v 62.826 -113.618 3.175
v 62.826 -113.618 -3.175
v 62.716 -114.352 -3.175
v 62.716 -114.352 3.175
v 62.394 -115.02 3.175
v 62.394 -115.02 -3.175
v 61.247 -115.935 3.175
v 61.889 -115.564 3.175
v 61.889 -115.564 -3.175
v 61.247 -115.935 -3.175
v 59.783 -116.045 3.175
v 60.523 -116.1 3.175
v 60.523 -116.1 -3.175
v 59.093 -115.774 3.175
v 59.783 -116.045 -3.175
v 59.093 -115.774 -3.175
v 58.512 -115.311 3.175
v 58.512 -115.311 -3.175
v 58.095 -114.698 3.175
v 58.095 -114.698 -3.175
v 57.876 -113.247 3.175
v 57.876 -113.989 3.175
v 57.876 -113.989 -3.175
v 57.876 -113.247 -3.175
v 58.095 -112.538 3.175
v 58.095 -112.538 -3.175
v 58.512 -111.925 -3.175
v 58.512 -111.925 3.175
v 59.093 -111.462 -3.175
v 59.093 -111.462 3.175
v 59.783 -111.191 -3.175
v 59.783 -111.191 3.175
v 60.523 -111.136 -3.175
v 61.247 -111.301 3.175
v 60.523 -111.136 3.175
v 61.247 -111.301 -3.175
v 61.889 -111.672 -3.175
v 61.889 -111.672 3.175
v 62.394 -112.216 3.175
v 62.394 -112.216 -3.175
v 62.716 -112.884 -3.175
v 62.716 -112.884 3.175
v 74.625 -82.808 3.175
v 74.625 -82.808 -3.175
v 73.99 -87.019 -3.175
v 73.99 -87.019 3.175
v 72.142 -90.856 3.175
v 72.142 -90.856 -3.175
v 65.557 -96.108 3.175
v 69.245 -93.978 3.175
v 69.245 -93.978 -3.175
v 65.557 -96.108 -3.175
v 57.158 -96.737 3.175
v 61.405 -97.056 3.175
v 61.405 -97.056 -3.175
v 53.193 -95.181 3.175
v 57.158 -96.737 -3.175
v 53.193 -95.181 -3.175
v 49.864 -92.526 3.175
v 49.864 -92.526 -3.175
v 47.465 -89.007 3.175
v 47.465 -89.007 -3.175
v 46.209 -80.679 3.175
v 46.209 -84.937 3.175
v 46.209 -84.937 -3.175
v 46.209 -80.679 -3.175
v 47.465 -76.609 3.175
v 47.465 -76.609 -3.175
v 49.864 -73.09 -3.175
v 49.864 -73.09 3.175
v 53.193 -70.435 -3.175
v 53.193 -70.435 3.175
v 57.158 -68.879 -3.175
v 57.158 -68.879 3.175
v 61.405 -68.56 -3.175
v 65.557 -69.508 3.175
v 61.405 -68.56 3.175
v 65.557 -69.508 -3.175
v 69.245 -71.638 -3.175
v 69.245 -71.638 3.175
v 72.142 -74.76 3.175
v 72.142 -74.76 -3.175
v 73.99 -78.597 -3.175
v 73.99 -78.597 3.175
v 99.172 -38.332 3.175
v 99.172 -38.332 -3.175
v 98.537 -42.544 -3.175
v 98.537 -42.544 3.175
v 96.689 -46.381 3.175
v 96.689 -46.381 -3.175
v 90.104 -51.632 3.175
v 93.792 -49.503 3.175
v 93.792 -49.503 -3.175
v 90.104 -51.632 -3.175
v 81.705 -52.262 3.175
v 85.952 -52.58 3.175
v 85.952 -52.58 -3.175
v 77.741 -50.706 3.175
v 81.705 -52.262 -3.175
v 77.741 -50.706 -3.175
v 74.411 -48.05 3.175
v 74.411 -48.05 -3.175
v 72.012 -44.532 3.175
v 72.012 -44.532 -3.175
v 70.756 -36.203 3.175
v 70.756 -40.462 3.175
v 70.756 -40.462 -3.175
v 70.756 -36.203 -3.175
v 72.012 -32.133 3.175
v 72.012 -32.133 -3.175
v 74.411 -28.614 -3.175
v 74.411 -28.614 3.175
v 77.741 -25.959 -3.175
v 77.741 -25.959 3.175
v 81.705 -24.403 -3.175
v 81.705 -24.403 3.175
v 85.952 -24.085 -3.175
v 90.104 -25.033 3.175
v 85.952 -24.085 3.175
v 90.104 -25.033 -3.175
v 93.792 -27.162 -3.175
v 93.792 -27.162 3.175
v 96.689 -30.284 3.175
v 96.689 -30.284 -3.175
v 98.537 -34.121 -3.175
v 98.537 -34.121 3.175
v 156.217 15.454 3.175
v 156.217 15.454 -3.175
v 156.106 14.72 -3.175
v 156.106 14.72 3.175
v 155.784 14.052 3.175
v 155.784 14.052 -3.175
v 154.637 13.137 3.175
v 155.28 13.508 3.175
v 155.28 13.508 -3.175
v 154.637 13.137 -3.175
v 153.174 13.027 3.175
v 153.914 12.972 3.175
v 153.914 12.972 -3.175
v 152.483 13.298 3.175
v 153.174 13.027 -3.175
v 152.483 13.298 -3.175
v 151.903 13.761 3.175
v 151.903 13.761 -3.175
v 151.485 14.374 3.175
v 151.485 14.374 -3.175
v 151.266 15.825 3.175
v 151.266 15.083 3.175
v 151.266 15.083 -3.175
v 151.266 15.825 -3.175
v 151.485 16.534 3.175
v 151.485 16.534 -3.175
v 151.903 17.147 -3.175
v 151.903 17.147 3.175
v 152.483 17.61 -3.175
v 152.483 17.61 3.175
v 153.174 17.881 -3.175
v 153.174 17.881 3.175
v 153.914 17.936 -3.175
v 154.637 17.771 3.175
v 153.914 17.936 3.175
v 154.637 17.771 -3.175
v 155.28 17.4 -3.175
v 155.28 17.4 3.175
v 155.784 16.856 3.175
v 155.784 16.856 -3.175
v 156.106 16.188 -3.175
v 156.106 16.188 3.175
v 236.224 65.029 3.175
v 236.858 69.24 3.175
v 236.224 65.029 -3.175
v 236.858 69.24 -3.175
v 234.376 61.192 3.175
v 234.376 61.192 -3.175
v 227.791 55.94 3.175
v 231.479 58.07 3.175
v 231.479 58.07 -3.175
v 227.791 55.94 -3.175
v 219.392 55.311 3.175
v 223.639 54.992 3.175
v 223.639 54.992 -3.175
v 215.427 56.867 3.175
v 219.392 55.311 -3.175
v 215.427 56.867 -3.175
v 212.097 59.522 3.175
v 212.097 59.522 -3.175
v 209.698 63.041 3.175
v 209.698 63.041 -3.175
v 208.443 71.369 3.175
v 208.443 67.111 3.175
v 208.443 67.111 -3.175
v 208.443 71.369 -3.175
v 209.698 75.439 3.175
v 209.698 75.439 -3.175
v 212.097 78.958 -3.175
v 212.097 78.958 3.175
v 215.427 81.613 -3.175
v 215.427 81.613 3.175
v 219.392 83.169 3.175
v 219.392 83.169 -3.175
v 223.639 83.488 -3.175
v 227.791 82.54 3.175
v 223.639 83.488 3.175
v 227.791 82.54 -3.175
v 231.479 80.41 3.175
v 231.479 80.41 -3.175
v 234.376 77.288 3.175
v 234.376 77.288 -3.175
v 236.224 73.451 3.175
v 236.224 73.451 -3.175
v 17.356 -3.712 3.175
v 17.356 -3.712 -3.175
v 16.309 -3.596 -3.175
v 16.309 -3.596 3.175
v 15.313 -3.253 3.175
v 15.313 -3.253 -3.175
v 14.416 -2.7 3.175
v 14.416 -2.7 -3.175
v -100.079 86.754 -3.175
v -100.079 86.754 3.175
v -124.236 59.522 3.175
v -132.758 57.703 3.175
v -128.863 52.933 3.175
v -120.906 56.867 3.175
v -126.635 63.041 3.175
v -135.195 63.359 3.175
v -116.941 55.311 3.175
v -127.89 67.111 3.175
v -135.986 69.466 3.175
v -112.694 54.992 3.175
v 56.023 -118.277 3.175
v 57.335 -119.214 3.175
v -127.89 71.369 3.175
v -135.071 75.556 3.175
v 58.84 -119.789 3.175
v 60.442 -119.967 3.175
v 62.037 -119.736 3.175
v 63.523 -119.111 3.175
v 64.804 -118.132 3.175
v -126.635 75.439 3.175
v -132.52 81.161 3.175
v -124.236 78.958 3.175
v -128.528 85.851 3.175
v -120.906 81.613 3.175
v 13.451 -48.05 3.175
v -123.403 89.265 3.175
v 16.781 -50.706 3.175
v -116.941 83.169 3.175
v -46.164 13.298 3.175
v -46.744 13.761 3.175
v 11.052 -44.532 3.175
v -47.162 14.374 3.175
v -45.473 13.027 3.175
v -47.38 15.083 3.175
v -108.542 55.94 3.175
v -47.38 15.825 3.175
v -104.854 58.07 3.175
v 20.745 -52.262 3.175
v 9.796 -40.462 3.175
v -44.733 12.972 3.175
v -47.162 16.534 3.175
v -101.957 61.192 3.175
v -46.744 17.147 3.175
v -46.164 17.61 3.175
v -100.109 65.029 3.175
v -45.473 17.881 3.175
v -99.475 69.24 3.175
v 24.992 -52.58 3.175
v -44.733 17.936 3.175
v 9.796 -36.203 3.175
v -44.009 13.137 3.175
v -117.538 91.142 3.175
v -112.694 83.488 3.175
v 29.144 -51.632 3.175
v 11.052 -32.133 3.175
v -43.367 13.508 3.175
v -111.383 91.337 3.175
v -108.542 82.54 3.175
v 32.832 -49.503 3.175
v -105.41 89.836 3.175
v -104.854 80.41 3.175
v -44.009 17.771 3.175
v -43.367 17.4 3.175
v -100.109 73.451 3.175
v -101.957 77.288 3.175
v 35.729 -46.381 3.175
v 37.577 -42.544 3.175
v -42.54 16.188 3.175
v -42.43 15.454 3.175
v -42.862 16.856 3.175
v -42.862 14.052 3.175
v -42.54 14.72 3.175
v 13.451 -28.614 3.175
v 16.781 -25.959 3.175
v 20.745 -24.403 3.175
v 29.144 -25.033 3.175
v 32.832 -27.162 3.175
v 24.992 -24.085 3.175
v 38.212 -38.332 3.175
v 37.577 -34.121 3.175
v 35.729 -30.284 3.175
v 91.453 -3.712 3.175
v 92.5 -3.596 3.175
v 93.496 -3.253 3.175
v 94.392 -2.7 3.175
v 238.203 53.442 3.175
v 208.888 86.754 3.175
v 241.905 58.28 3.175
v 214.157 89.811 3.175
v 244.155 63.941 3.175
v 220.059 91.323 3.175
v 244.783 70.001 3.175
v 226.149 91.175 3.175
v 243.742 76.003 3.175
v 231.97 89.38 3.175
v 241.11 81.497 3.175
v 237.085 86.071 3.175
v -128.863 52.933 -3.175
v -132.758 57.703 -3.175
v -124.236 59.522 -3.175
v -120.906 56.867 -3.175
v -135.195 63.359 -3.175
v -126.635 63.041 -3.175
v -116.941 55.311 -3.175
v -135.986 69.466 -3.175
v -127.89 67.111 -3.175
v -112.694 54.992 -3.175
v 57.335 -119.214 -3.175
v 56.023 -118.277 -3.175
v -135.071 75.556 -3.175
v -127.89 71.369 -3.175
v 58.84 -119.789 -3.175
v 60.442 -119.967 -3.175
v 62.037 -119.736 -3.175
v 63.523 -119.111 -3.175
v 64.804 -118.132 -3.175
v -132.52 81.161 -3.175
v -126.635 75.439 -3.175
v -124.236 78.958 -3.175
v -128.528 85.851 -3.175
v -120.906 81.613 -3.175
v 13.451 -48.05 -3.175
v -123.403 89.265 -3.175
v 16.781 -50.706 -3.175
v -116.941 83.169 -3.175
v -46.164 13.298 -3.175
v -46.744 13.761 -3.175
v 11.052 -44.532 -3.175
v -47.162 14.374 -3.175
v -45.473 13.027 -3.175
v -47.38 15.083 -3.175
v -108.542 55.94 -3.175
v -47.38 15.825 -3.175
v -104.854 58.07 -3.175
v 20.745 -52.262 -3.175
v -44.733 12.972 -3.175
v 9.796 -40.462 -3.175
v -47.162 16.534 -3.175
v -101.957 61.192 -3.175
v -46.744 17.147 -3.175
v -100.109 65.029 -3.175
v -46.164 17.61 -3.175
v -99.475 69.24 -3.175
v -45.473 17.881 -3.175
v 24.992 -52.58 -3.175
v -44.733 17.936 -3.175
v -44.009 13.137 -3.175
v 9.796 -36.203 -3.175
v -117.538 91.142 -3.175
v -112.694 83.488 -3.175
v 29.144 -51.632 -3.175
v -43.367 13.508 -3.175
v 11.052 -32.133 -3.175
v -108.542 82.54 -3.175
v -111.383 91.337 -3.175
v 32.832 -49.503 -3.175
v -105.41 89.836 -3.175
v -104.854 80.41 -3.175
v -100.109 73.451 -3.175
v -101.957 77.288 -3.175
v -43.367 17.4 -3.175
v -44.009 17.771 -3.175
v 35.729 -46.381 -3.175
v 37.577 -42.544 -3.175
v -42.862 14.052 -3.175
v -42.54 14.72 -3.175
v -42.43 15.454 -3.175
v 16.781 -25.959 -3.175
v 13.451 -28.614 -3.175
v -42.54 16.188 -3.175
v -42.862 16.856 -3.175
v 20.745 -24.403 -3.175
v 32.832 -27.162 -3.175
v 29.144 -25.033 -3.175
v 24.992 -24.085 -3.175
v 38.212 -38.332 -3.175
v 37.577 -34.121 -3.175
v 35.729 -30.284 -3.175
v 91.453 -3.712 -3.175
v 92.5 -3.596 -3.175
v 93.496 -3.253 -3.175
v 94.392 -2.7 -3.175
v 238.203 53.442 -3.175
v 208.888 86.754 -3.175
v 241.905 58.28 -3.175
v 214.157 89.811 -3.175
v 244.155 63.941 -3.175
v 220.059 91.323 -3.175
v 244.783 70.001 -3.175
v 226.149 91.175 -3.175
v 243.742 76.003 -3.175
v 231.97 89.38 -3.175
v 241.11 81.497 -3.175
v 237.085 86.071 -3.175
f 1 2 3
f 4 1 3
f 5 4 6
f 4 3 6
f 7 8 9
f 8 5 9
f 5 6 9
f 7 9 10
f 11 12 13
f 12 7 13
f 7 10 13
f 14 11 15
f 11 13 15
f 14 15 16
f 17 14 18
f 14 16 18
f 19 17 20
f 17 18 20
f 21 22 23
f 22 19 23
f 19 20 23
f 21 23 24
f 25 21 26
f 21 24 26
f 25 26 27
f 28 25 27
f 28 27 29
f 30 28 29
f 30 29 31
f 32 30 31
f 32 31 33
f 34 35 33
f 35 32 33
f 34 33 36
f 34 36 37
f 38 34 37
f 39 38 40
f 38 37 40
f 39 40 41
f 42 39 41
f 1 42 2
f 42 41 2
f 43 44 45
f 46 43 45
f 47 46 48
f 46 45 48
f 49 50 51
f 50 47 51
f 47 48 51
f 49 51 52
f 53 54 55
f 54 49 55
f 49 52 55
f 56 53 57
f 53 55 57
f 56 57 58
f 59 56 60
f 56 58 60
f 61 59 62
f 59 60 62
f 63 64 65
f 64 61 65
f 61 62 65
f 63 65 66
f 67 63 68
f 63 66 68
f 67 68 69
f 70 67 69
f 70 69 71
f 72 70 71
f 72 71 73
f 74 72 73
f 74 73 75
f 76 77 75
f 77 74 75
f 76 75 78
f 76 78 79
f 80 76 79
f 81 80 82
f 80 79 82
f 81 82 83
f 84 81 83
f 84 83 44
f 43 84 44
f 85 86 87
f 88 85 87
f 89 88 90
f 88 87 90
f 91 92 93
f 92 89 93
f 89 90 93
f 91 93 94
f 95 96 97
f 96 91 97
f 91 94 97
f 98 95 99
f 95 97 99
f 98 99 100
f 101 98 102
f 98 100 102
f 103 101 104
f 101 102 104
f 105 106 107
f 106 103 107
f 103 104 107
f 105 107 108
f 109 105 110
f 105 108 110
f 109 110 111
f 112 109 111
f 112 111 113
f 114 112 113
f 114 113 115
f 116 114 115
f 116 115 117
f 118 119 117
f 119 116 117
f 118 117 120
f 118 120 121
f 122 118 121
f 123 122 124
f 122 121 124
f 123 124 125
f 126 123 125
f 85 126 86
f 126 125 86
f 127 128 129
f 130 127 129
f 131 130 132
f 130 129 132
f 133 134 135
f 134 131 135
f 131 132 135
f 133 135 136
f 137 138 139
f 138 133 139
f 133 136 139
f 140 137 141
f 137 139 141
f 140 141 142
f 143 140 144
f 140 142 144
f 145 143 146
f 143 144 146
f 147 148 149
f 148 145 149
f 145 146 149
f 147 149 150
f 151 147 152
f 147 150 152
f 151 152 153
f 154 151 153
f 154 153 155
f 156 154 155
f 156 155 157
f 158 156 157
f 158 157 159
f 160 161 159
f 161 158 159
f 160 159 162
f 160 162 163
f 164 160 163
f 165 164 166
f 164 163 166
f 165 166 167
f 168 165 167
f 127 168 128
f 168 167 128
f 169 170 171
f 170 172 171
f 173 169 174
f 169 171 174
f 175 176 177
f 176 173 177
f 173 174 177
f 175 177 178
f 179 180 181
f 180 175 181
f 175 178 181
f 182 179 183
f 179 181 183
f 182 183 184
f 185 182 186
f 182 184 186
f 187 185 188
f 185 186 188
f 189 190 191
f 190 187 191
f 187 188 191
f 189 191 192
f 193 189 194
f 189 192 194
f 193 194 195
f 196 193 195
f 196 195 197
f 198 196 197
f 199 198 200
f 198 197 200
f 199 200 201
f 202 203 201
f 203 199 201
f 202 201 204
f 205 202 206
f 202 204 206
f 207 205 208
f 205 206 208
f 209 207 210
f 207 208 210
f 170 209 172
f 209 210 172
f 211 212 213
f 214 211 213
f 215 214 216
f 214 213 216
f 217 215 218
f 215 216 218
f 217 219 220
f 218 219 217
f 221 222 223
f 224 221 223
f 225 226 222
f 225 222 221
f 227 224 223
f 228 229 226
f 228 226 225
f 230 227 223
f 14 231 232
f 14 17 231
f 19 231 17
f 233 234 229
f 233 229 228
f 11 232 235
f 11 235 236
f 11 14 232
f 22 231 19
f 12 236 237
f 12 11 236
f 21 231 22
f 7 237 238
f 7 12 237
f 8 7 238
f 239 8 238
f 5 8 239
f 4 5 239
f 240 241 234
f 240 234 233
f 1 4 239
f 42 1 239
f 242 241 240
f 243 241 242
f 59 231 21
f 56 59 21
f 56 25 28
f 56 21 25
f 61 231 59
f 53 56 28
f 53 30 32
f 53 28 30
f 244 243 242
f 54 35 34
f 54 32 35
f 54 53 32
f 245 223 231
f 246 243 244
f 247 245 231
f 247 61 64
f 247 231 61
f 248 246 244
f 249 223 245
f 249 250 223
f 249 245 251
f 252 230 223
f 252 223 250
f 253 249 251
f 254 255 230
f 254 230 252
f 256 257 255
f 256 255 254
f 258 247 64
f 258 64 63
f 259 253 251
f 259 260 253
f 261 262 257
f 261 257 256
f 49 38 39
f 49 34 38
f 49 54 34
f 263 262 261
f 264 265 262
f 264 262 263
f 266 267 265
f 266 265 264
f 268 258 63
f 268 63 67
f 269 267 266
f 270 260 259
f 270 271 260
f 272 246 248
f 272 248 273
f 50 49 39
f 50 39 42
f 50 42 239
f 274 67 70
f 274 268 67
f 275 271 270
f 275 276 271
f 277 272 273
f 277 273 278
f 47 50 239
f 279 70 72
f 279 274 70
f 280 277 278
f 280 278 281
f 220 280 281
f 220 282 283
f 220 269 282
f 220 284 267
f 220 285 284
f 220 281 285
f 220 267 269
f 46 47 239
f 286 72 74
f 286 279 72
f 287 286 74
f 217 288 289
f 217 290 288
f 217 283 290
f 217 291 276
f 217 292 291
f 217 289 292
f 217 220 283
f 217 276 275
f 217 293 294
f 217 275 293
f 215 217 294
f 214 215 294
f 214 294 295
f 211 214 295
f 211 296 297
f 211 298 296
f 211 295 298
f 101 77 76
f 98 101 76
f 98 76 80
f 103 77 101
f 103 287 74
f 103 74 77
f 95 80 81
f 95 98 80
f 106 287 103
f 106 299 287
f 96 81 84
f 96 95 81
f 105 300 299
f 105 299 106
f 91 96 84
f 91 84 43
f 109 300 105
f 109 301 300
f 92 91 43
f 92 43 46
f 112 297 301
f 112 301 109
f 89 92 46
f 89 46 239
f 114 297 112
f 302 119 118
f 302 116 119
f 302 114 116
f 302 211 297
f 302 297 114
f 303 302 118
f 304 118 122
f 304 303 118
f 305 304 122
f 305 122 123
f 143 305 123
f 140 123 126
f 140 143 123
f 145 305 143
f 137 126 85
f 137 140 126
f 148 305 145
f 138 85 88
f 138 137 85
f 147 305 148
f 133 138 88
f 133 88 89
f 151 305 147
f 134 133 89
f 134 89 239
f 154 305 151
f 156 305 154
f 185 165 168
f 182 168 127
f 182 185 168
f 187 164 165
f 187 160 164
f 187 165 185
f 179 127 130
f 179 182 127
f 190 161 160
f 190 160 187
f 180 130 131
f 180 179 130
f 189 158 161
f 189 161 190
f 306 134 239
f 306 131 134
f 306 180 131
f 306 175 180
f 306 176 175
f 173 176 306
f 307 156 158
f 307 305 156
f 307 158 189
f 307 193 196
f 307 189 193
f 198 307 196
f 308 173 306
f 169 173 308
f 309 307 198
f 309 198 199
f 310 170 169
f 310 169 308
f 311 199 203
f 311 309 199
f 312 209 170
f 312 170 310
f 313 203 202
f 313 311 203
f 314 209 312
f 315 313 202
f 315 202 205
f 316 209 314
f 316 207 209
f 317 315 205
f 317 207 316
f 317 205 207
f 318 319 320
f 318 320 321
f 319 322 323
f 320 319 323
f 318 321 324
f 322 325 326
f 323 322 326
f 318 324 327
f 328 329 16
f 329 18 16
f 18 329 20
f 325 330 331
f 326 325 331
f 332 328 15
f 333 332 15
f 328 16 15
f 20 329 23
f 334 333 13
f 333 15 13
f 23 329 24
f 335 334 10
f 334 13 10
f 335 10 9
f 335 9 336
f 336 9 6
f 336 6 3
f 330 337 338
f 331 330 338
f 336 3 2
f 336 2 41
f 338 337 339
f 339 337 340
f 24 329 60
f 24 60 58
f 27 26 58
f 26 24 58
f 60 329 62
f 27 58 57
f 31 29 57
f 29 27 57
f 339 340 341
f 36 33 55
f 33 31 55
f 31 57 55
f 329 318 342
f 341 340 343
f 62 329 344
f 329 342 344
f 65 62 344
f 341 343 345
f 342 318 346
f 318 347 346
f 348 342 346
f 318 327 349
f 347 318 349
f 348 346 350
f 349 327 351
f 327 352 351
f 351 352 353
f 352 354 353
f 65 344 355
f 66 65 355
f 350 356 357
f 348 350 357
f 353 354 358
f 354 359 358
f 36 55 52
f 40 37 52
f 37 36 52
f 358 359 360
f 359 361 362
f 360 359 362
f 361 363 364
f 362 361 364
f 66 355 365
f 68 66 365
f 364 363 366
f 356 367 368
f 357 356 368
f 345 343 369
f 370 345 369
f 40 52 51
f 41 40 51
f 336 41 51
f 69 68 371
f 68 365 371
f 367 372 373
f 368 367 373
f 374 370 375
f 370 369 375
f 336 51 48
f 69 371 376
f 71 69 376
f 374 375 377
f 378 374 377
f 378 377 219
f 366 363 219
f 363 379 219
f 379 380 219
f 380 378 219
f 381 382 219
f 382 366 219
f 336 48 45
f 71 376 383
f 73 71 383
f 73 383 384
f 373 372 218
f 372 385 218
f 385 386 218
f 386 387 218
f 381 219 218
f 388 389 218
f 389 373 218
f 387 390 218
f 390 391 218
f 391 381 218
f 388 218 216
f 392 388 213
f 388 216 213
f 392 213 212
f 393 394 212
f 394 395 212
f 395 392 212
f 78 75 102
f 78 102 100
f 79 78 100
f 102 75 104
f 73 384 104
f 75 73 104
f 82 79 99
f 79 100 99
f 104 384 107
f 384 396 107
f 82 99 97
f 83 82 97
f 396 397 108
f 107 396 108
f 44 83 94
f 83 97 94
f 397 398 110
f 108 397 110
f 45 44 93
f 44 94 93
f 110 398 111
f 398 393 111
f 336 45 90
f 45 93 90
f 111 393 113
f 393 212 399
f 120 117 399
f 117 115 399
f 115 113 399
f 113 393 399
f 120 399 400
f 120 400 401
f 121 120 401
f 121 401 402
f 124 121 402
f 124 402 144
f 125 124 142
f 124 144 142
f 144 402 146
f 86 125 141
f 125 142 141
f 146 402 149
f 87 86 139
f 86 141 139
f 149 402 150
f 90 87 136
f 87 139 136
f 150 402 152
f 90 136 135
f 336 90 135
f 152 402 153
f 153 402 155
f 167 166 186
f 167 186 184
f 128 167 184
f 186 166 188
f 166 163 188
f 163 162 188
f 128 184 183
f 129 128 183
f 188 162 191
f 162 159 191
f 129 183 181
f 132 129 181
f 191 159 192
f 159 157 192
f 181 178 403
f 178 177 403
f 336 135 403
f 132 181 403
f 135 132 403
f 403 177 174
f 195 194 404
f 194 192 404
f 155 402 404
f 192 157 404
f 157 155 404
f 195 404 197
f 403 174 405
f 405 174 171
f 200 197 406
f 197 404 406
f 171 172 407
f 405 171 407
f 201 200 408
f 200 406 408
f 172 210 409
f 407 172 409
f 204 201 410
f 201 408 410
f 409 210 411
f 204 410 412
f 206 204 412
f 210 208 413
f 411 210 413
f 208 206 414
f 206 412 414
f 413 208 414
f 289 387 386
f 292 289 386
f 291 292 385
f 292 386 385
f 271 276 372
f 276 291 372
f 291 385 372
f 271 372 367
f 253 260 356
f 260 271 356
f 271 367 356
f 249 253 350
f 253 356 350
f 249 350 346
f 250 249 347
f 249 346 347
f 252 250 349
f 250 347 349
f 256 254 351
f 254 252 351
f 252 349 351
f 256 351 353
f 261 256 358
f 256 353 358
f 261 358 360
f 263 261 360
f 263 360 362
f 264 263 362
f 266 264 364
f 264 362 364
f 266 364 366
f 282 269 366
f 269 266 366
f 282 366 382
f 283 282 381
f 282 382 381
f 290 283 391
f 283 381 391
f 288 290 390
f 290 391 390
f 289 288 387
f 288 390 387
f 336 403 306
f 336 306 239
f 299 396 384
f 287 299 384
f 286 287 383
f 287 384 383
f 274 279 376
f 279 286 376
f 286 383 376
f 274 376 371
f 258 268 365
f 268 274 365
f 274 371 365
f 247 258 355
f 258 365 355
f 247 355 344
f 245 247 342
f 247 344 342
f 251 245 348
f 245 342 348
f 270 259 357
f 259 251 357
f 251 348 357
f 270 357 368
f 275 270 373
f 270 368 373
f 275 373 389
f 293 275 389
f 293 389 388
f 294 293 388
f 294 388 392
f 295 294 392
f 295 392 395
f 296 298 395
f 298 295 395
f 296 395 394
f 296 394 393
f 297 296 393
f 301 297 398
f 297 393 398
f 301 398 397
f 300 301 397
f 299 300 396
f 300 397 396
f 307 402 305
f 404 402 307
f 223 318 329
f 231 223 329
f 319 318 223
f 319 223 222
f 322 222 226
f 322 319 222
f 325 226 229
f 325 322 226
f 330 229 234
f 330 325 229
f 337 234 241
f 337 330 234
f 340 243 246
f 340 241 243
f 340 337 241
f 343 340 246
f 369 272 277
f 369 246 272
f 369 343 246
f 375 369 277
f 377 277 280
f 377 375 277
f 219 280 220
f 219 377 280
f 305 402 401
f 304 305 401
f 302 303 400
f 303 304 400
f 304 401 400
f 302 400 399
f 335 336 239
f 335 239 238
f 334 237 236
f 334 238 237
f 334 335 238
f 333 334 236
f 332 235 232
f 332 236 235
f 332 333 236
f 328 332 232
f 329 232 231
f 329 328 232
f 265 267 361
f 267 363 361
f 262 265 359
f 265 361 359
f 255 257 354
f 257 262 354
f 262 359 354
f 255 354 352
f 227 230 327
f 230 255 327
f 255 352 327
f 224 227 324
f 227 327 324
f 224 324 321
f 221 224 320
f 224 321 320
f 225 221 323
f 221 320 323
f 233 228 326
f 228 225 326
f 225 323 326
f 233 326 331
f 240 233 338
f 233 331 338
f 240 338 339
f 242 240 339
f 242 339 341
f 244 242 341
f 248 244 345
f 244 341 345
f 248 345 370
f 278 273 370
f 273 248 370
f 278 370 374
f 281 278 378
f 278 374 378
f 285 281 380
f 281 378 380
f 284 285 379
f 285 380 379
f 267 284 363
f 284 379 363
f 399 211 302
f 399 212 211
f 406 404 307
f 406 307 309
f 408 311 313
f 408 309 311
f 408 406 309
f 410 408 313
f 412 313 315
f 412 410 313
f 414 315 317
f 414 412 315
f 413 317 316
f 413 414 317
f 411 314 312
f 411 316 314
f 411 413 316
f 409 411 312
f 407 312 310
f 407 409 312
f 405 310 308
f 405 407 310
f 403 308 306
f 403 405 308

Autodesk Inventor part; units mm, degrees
ref_plane "YZ Plane" through (0, 0, 0) normal (1, 0, 0) x (0, 1, 0)
ref_plane "XZ Plane" through (0, 0, 0) normal (0, 1, 0) x (-1, 0, 0)
ref_plane "XY Plane" through (0, 0, 0) normal (0, 0, 1) x (1, 0, 0)
sketch "Sketch1" plane through (60.3372, -82.808, 0) normal (0, 0, 1) x (1, 0, 0)
  circle A0 centre (0, 0) radius 20.32 construction
  circle A1 centre (0, 0) radius 22.86 construction
  circle A2 centre (24.5471, 44.4756) radius 30.48 construction
  circle A3 centre (-36.4129, 44.4756) radius 30.48 construction
  circle A4 centre (-36.4129, 44.4756) radius 33.02 construction
  line L0 (-15.4952, 18.9262) -> (-14.4815, 17.688)
  circle A5 centre (24.5471, 44.4756) radius 33.02 construction
  circle A6 centre (24.5471, 44.4756) radius 14.2875
  circle A7 centre (-36.4129, 44.4756) radius 14.2875
  circle A8 centre (0, 0) radius 14.2875
  circle A9 centre (24.5471, 44.4756) radius 19.1008 construction
  circle A10 centre (24.5471, 44.4756) radius 21.0058 construction
  circle A11 centre (-36.4129, 44.4756) radius 19.1008 construction
  circle A12 centre (-36.4129, 44.4756) radius 21.0058 construction
  line L1 (-36.4129, 44.4756) -> (-174.0993, 152.048) construction
  line L2 (24.5471, 44.4756) -> (162.2336, 152.048) construction
  circle A13 centre (-174.0993, 152.048) radius 14.2875
  circle A14 centre (162.2336, 152.048) radius 14.2875
  circle A15 centre (-174.0993, 152.048) radius 22.225 construction
  circle A16 centre (162.2336, 152.048) radius 22.225 construction
  line L3 (-160.4162, 169.5616) -> (-45.921, 80.1081)
  line L4 (-42.9811, 79.0958) -> (31.1154, 79.0958)
  arc A17 (31.1154, 79.0958) -> (34.0553, 80.1081) centre (31.1154, 83.871) ccw
  arc A18 (-45.921, 80.1081) -> (-42.9811, 79.0958) centre (-42.9811, 83.871) ccw
  line L5 (34.0553, 80.1081) -> (148.5505, 169.5616)
  line L6 (-36.4129, 79.0958) -> (-36.4129, 77.4956) construction
  arc A19 (177.8656, 136.2496) -> (148.5505, 169.5616) centre (162.2336, 152.048) ccw
  arc A20 (-160.4162, 169.5616) -> (-189.2001, 135.7411) centre (-174.0993, 152.048) ccw
  circle A21 centre (-105.2561, 98.2618) radius 2.4892
  circle A22 centre (0, -30.8102) radius 6.35 construction
  circle A23 centre (0, -30.8102) radius 2.4892
  line L7 (0, -22.86) -> (0, -24.4602)
  line L8 (-189.2001, 135.7411) -> (-4.3145, -35.4693)
  line L9 (177.8656, 136.2496) -> (4.4663, -35.324)
  arc A24 (-4.3145, -35.4693) -> (4.4663, -35.324) centre (0, -30.8102) ccw
  circle A25 centre (-105.2561, 98.2618) radius 6.35 construction
  circle A26 centre (93.3904, 98.2618) radius 6.35 construction
  circle A27 centre (93.3904, 98.2618) radius 2.4892
  circle A28 centre (-174.0993, 152.048) radius 50.8 construction
  circle A29 centre (162.2336, 152.048) radius 50.8 construction
  line L10 (-333.708, 192.5945) -> (-312.3217, 152.048) construction
  dimension "d25" = 40.64
  dimension "d24" = 2.54
  dimension "d23" = 60.96
  dimension "d22" = 2.54
  dimension "d21" = 1.6002
  dimension "d20" = 28.575
  dimension "d19" = 38.2016
  dimension "d18" = 42.0116
  dimension "d17" = 174.7266
  dimension "d16" = 104
  dimension "d15" = 28.575
  dimension "d14" = 44.45
  dimension "d13" = 44.45
  dimension "d12" = 4.7752
  dimension "d11" = 1.6002
  dimension "d9" = 4.9784
  dimension "d8" = 12.7
  dimension "d7" = 4.9784
  dimension "d6" = 1.6002
  dimension "d5" = 12.7
  dimension "d3" = 12.7
  dimension "d2" = 4.9784
  dimension "d10" = 87.3633
  dimension "d4" = 87.3633
  dimension "d0" = 101.6
  dimension "d1" = 101.6
extrude "Extrusion1" add sketch "Sketch1" along normal mid plane 6.35
properties part number "Gearbox #2 Top Plate"
